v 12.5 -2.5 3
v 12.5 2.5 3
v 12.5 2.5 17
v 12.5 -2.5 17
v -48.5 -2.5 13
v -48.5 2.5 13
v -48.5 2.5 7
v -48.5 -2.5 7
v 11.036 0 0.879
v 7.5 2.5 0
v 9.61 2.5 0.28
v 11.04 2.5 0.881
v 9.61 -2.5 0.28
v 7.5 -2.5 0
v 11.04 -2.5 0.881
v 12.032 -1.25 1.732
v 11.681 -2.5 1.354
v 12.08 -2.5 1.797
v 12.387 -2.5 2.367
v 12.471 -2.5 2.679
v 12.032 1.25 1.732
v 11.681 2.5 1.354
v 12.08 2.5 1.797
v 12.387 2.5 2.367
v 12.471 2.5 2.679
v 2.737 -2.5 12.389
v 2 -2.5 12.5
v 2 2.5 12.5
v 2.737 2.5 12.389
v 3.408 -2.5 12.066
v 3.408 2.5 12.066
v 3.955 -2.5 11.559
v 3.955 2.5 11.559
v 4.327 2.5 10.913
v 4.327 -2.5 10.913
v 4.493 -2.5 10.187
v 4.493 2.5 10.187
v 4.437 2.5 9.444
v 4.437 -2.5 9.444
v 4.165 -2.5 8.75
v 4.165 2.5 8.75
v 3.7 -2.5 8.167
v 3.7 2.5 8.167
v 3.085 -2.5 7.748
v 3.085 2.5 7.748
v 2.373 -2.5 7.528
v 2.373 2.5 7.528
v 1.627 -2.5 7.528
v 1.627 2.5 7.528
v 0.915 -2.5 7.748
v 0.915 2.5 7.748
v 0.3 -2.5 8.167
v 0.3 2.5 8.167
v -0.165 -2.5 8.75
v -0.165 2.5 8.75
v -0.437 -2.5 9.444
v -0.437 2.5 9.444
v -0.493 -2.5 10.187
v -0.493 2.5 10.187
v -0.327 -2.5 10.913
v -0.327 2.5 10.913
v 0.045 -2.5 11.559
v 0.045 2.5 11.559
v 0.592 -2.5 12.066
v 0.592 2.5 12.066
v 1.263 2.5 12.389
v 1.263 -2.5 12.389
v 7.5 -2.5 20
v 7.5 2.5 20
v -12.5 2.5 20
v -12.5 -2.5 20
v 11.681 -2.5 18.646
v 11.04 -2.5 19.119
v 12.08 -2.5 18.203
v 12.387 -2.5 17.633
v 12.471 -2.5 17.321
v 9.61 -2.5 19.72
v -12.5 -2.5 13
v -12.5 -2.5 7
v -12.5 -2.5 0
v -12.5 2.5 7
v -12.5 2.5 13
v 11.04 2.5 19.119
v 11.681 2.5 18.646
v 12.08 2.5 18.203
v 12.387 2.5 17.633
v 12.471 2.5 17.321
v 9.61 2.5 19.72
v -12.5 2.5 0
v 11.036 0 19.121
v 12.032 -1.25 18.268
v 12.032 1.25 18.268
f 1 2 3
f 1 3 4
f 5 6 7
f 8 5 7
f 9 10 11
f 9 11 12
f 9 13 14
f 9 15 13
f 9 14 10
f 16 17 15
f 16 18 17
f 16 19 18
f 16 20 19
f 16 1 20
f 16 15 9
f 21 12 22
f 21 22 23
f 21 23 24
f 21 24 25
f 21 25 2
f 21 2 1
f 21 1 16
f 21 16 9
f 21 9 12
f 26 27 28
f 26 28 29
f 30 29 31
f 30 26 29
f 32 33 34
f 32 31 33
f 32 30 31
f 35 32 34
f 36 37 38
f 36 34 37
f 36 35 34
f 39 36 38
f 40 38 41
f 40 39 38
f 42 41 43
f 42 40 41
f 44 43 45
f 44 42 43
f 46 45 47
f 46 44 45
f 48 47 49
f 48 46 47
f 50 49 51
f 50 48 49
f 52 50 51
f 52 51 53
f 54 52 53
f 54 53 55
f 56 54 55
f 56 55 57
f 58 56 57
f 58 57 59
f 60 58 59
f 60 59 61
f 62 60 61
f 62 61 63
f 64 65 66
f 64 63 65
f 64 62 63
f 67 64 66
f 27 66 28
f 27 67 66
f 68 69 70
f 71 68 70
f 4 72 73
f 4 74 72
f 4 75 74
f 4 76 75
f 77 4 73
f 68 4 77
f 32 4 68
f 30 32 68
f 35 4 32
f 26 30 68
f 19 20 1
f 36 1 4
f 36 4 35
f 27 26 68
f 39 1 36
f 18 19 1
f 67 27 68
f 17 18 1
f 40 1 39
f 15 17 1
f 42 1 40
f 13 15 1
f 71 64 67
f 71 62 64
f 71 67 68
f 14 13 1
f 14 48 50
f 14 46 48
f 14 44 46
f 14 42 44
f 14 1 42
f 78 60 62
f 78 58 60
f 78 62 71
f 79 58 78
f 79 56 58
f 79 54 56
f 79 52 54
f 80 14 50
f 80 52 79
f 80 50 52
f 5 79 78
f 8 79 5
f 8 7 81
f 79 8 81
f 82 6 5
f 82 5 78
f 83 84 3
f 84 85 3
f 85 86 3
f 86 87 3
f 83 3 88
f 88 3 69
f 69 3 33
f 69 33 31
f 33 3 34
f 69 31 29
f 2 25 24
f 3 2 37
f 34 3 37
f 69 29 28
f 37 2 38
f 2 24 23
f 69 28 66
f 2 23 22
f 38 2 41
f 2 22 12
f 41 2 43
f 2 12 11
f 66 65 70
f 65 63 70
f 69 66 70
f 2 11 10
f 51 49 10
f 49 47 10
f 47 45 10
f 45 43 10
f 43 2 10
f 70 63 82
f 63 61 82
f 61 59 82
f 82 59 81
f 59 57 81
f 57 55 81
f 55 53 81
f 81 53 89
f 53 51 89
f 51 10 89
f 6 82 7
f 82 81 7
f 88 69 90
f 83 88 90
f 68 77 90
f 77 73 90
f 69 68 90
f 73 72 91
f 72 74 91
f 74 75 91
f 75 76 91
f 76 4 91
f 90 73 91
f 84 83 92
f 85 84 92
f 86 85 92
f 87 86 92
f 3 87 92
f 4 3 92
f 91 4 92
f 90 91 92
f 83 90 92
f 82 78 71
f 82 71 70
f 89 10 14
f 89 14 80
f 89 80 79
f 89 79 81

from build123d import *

# Parameters (mm, degrees)
BOSS_EXTRUDE1_DEPTH             = 20
CUT_EXTRUDE2_DEPTH              = 25.109126902
CUT_EXTRUDE2_DEPTH_BACK         = 25.109126902
SKETCH2_R                       = 2.5
FILLET1_SIZE                    = 3
FILLET1_SIZE_2                  = 5
BOSS_EXTRUDE2_REACH             = 25.717
SKETCH3_W                       = 36
SKETCH3_H                       = 6
BOSS_EXTRUDE2_DIRECTION_2_REACH = 25.717


with BuildPart() as part:
    # Sketch1 → Boss-Extrude1 (new body)
    with BuildSketch(Plane.XY):
        Polygon((6.5, 2.5), (12.5, 2.5), (12.5, -2.5), (-12.5, -2.5), (-12.5, 2.5), align=None)
    extrude(amount=BOSS_EXTRUDE1_DEPTH)

    # Sketch2 → Cut-Extrude2 (cut, two sides: drawn at the far end of the back side and taken through both)
    with BuildSketch(Plane(origin=(0, 2.5, 0), x_dir=(1, 0, 0), z_dir=(0, 1, 0)).offset(-CUT_EXTRUDE2_DEPTH_BACK)):
        with Locations(Location((2, -10, 0), (0, 0, 270))):
            Circle(SKETCH2_R)
    extrude(amount=CUT_EXTRUDE2_DEPTH + CUT_EXTRUDE2_DEPTH_BACK, mode=Mode.SUBTRACT)

    # Fillet1
    # an asymmetric fillet: 5, 3 mm, written as the material it takes off along each edge
    with BuildSketch(Plane(origin=(12.5, 15, 20), x_dir=(0, 0, -1), z_dir=(0, -1, 0))) as fillet1_piece_1:
        with BuildLine():
            Bezier((FILLET1_SIZE, 0), (0, 0), (0, -FILLET1_SIZE_2), weights=[1, 0.707106781, 1])
            Line((0, -FILLET1_SIZE_2), (0, 0))
            Line((0, 0), (FILLET1_SIZE, 0))
        make_face()
    extrude(amount=30, mode=Mode.SUBTRACT)
    with BuildSketch(Plane(origin=(12.5, 15, 0), x_dir=(0, 0, 1), z_dir=(0, -1, 0))) as fillet1_piece_2:
        with BuildLine():
            Bezier((FILLET1_SIZE, 0), (0, 0), (0, FILLET1_SIZE_2), weights=[1, 0.707106781, 1])
            Line((0, FILLET1_SIZE_2), (0, 0))
            Line((0, 0), (FILLET1_SIZE, 0))
        make_face()
    extrude(amount=30, mode=Mode.SUBTRACT)

    # Boss-Extrude2: up to this face of the body (flat: up to its plane)
    boss_extrude2_end = Plane(part.part.faces().sort_by_distance((12.179843785, 2.5, 10))[0])
    # Sketch3 → Boss-Extrude2 (add, up to the picked face)
    with BuildSketch(Plane(origin=(0, 0, 0), x_dir=(1, 0, 0), z_dir=(0, 1, 0)), mode=Mode.PRIVATE) as boss_extrude2_sk1:
        with Locations((-30.5, -10)):
            Rectangle(SKETCH3_W, SKETCH3_H)
    boss_extrude2_tool1 = split(extrude(boss_extrude2_sk1.sketch, amount=BOSS_EXTRUDE2_REACH, mode=Mode.PRIVATE), bisect_by=boss_extrude2_end, keep=Keep.BOTH, mode=Mode.PRIVATE)
    add(boss_extrude2_tool1.solids().sort_by(Axis((-30.5, 0, 10), (0, 1, 0)))[0])

    # Boss-Extrude2 direction 2: up to this face of the body (flat: up to its plane)
    boss_extrude2_direction_2_end = Plane(part.part.faces().sort_by_distance((-2.5, -2.5, 0.320156215))[0])
    # Sketch3 → Boss-Extrude2 direction 2 (add, up to the picked face)
    with BuildSketch(Plane(origin=(0, 0, 0), x_dir=(1, 0, 0), z_dir=(0, 1, 0)), mode=Mode.PRIVATE) as boss_extrude2_direction_2_sk1:
        with Locations((-30.5, -10)):
            Rectangle(SKETCH3_W, SKETCH3_H)
    boss_extrude2_direction_2_tool1 = split(extrude(boss_extrude2_direction_2_sk1.sketch, amount=-BOSS_EXTRUDE2_DIRECTION_2_REACH, mode=Mode.PRIVATE), bisect_by=boss_extrude2_direction_2_end, keep=Keep.BOTH, mode=Mode.PRIVATE)
    add(boss_extrude2_direction_2_tool1.solids().sort_by(Axis((-30.5, 0, 10), (0, -1, 0)))[0])


solid = part.part
